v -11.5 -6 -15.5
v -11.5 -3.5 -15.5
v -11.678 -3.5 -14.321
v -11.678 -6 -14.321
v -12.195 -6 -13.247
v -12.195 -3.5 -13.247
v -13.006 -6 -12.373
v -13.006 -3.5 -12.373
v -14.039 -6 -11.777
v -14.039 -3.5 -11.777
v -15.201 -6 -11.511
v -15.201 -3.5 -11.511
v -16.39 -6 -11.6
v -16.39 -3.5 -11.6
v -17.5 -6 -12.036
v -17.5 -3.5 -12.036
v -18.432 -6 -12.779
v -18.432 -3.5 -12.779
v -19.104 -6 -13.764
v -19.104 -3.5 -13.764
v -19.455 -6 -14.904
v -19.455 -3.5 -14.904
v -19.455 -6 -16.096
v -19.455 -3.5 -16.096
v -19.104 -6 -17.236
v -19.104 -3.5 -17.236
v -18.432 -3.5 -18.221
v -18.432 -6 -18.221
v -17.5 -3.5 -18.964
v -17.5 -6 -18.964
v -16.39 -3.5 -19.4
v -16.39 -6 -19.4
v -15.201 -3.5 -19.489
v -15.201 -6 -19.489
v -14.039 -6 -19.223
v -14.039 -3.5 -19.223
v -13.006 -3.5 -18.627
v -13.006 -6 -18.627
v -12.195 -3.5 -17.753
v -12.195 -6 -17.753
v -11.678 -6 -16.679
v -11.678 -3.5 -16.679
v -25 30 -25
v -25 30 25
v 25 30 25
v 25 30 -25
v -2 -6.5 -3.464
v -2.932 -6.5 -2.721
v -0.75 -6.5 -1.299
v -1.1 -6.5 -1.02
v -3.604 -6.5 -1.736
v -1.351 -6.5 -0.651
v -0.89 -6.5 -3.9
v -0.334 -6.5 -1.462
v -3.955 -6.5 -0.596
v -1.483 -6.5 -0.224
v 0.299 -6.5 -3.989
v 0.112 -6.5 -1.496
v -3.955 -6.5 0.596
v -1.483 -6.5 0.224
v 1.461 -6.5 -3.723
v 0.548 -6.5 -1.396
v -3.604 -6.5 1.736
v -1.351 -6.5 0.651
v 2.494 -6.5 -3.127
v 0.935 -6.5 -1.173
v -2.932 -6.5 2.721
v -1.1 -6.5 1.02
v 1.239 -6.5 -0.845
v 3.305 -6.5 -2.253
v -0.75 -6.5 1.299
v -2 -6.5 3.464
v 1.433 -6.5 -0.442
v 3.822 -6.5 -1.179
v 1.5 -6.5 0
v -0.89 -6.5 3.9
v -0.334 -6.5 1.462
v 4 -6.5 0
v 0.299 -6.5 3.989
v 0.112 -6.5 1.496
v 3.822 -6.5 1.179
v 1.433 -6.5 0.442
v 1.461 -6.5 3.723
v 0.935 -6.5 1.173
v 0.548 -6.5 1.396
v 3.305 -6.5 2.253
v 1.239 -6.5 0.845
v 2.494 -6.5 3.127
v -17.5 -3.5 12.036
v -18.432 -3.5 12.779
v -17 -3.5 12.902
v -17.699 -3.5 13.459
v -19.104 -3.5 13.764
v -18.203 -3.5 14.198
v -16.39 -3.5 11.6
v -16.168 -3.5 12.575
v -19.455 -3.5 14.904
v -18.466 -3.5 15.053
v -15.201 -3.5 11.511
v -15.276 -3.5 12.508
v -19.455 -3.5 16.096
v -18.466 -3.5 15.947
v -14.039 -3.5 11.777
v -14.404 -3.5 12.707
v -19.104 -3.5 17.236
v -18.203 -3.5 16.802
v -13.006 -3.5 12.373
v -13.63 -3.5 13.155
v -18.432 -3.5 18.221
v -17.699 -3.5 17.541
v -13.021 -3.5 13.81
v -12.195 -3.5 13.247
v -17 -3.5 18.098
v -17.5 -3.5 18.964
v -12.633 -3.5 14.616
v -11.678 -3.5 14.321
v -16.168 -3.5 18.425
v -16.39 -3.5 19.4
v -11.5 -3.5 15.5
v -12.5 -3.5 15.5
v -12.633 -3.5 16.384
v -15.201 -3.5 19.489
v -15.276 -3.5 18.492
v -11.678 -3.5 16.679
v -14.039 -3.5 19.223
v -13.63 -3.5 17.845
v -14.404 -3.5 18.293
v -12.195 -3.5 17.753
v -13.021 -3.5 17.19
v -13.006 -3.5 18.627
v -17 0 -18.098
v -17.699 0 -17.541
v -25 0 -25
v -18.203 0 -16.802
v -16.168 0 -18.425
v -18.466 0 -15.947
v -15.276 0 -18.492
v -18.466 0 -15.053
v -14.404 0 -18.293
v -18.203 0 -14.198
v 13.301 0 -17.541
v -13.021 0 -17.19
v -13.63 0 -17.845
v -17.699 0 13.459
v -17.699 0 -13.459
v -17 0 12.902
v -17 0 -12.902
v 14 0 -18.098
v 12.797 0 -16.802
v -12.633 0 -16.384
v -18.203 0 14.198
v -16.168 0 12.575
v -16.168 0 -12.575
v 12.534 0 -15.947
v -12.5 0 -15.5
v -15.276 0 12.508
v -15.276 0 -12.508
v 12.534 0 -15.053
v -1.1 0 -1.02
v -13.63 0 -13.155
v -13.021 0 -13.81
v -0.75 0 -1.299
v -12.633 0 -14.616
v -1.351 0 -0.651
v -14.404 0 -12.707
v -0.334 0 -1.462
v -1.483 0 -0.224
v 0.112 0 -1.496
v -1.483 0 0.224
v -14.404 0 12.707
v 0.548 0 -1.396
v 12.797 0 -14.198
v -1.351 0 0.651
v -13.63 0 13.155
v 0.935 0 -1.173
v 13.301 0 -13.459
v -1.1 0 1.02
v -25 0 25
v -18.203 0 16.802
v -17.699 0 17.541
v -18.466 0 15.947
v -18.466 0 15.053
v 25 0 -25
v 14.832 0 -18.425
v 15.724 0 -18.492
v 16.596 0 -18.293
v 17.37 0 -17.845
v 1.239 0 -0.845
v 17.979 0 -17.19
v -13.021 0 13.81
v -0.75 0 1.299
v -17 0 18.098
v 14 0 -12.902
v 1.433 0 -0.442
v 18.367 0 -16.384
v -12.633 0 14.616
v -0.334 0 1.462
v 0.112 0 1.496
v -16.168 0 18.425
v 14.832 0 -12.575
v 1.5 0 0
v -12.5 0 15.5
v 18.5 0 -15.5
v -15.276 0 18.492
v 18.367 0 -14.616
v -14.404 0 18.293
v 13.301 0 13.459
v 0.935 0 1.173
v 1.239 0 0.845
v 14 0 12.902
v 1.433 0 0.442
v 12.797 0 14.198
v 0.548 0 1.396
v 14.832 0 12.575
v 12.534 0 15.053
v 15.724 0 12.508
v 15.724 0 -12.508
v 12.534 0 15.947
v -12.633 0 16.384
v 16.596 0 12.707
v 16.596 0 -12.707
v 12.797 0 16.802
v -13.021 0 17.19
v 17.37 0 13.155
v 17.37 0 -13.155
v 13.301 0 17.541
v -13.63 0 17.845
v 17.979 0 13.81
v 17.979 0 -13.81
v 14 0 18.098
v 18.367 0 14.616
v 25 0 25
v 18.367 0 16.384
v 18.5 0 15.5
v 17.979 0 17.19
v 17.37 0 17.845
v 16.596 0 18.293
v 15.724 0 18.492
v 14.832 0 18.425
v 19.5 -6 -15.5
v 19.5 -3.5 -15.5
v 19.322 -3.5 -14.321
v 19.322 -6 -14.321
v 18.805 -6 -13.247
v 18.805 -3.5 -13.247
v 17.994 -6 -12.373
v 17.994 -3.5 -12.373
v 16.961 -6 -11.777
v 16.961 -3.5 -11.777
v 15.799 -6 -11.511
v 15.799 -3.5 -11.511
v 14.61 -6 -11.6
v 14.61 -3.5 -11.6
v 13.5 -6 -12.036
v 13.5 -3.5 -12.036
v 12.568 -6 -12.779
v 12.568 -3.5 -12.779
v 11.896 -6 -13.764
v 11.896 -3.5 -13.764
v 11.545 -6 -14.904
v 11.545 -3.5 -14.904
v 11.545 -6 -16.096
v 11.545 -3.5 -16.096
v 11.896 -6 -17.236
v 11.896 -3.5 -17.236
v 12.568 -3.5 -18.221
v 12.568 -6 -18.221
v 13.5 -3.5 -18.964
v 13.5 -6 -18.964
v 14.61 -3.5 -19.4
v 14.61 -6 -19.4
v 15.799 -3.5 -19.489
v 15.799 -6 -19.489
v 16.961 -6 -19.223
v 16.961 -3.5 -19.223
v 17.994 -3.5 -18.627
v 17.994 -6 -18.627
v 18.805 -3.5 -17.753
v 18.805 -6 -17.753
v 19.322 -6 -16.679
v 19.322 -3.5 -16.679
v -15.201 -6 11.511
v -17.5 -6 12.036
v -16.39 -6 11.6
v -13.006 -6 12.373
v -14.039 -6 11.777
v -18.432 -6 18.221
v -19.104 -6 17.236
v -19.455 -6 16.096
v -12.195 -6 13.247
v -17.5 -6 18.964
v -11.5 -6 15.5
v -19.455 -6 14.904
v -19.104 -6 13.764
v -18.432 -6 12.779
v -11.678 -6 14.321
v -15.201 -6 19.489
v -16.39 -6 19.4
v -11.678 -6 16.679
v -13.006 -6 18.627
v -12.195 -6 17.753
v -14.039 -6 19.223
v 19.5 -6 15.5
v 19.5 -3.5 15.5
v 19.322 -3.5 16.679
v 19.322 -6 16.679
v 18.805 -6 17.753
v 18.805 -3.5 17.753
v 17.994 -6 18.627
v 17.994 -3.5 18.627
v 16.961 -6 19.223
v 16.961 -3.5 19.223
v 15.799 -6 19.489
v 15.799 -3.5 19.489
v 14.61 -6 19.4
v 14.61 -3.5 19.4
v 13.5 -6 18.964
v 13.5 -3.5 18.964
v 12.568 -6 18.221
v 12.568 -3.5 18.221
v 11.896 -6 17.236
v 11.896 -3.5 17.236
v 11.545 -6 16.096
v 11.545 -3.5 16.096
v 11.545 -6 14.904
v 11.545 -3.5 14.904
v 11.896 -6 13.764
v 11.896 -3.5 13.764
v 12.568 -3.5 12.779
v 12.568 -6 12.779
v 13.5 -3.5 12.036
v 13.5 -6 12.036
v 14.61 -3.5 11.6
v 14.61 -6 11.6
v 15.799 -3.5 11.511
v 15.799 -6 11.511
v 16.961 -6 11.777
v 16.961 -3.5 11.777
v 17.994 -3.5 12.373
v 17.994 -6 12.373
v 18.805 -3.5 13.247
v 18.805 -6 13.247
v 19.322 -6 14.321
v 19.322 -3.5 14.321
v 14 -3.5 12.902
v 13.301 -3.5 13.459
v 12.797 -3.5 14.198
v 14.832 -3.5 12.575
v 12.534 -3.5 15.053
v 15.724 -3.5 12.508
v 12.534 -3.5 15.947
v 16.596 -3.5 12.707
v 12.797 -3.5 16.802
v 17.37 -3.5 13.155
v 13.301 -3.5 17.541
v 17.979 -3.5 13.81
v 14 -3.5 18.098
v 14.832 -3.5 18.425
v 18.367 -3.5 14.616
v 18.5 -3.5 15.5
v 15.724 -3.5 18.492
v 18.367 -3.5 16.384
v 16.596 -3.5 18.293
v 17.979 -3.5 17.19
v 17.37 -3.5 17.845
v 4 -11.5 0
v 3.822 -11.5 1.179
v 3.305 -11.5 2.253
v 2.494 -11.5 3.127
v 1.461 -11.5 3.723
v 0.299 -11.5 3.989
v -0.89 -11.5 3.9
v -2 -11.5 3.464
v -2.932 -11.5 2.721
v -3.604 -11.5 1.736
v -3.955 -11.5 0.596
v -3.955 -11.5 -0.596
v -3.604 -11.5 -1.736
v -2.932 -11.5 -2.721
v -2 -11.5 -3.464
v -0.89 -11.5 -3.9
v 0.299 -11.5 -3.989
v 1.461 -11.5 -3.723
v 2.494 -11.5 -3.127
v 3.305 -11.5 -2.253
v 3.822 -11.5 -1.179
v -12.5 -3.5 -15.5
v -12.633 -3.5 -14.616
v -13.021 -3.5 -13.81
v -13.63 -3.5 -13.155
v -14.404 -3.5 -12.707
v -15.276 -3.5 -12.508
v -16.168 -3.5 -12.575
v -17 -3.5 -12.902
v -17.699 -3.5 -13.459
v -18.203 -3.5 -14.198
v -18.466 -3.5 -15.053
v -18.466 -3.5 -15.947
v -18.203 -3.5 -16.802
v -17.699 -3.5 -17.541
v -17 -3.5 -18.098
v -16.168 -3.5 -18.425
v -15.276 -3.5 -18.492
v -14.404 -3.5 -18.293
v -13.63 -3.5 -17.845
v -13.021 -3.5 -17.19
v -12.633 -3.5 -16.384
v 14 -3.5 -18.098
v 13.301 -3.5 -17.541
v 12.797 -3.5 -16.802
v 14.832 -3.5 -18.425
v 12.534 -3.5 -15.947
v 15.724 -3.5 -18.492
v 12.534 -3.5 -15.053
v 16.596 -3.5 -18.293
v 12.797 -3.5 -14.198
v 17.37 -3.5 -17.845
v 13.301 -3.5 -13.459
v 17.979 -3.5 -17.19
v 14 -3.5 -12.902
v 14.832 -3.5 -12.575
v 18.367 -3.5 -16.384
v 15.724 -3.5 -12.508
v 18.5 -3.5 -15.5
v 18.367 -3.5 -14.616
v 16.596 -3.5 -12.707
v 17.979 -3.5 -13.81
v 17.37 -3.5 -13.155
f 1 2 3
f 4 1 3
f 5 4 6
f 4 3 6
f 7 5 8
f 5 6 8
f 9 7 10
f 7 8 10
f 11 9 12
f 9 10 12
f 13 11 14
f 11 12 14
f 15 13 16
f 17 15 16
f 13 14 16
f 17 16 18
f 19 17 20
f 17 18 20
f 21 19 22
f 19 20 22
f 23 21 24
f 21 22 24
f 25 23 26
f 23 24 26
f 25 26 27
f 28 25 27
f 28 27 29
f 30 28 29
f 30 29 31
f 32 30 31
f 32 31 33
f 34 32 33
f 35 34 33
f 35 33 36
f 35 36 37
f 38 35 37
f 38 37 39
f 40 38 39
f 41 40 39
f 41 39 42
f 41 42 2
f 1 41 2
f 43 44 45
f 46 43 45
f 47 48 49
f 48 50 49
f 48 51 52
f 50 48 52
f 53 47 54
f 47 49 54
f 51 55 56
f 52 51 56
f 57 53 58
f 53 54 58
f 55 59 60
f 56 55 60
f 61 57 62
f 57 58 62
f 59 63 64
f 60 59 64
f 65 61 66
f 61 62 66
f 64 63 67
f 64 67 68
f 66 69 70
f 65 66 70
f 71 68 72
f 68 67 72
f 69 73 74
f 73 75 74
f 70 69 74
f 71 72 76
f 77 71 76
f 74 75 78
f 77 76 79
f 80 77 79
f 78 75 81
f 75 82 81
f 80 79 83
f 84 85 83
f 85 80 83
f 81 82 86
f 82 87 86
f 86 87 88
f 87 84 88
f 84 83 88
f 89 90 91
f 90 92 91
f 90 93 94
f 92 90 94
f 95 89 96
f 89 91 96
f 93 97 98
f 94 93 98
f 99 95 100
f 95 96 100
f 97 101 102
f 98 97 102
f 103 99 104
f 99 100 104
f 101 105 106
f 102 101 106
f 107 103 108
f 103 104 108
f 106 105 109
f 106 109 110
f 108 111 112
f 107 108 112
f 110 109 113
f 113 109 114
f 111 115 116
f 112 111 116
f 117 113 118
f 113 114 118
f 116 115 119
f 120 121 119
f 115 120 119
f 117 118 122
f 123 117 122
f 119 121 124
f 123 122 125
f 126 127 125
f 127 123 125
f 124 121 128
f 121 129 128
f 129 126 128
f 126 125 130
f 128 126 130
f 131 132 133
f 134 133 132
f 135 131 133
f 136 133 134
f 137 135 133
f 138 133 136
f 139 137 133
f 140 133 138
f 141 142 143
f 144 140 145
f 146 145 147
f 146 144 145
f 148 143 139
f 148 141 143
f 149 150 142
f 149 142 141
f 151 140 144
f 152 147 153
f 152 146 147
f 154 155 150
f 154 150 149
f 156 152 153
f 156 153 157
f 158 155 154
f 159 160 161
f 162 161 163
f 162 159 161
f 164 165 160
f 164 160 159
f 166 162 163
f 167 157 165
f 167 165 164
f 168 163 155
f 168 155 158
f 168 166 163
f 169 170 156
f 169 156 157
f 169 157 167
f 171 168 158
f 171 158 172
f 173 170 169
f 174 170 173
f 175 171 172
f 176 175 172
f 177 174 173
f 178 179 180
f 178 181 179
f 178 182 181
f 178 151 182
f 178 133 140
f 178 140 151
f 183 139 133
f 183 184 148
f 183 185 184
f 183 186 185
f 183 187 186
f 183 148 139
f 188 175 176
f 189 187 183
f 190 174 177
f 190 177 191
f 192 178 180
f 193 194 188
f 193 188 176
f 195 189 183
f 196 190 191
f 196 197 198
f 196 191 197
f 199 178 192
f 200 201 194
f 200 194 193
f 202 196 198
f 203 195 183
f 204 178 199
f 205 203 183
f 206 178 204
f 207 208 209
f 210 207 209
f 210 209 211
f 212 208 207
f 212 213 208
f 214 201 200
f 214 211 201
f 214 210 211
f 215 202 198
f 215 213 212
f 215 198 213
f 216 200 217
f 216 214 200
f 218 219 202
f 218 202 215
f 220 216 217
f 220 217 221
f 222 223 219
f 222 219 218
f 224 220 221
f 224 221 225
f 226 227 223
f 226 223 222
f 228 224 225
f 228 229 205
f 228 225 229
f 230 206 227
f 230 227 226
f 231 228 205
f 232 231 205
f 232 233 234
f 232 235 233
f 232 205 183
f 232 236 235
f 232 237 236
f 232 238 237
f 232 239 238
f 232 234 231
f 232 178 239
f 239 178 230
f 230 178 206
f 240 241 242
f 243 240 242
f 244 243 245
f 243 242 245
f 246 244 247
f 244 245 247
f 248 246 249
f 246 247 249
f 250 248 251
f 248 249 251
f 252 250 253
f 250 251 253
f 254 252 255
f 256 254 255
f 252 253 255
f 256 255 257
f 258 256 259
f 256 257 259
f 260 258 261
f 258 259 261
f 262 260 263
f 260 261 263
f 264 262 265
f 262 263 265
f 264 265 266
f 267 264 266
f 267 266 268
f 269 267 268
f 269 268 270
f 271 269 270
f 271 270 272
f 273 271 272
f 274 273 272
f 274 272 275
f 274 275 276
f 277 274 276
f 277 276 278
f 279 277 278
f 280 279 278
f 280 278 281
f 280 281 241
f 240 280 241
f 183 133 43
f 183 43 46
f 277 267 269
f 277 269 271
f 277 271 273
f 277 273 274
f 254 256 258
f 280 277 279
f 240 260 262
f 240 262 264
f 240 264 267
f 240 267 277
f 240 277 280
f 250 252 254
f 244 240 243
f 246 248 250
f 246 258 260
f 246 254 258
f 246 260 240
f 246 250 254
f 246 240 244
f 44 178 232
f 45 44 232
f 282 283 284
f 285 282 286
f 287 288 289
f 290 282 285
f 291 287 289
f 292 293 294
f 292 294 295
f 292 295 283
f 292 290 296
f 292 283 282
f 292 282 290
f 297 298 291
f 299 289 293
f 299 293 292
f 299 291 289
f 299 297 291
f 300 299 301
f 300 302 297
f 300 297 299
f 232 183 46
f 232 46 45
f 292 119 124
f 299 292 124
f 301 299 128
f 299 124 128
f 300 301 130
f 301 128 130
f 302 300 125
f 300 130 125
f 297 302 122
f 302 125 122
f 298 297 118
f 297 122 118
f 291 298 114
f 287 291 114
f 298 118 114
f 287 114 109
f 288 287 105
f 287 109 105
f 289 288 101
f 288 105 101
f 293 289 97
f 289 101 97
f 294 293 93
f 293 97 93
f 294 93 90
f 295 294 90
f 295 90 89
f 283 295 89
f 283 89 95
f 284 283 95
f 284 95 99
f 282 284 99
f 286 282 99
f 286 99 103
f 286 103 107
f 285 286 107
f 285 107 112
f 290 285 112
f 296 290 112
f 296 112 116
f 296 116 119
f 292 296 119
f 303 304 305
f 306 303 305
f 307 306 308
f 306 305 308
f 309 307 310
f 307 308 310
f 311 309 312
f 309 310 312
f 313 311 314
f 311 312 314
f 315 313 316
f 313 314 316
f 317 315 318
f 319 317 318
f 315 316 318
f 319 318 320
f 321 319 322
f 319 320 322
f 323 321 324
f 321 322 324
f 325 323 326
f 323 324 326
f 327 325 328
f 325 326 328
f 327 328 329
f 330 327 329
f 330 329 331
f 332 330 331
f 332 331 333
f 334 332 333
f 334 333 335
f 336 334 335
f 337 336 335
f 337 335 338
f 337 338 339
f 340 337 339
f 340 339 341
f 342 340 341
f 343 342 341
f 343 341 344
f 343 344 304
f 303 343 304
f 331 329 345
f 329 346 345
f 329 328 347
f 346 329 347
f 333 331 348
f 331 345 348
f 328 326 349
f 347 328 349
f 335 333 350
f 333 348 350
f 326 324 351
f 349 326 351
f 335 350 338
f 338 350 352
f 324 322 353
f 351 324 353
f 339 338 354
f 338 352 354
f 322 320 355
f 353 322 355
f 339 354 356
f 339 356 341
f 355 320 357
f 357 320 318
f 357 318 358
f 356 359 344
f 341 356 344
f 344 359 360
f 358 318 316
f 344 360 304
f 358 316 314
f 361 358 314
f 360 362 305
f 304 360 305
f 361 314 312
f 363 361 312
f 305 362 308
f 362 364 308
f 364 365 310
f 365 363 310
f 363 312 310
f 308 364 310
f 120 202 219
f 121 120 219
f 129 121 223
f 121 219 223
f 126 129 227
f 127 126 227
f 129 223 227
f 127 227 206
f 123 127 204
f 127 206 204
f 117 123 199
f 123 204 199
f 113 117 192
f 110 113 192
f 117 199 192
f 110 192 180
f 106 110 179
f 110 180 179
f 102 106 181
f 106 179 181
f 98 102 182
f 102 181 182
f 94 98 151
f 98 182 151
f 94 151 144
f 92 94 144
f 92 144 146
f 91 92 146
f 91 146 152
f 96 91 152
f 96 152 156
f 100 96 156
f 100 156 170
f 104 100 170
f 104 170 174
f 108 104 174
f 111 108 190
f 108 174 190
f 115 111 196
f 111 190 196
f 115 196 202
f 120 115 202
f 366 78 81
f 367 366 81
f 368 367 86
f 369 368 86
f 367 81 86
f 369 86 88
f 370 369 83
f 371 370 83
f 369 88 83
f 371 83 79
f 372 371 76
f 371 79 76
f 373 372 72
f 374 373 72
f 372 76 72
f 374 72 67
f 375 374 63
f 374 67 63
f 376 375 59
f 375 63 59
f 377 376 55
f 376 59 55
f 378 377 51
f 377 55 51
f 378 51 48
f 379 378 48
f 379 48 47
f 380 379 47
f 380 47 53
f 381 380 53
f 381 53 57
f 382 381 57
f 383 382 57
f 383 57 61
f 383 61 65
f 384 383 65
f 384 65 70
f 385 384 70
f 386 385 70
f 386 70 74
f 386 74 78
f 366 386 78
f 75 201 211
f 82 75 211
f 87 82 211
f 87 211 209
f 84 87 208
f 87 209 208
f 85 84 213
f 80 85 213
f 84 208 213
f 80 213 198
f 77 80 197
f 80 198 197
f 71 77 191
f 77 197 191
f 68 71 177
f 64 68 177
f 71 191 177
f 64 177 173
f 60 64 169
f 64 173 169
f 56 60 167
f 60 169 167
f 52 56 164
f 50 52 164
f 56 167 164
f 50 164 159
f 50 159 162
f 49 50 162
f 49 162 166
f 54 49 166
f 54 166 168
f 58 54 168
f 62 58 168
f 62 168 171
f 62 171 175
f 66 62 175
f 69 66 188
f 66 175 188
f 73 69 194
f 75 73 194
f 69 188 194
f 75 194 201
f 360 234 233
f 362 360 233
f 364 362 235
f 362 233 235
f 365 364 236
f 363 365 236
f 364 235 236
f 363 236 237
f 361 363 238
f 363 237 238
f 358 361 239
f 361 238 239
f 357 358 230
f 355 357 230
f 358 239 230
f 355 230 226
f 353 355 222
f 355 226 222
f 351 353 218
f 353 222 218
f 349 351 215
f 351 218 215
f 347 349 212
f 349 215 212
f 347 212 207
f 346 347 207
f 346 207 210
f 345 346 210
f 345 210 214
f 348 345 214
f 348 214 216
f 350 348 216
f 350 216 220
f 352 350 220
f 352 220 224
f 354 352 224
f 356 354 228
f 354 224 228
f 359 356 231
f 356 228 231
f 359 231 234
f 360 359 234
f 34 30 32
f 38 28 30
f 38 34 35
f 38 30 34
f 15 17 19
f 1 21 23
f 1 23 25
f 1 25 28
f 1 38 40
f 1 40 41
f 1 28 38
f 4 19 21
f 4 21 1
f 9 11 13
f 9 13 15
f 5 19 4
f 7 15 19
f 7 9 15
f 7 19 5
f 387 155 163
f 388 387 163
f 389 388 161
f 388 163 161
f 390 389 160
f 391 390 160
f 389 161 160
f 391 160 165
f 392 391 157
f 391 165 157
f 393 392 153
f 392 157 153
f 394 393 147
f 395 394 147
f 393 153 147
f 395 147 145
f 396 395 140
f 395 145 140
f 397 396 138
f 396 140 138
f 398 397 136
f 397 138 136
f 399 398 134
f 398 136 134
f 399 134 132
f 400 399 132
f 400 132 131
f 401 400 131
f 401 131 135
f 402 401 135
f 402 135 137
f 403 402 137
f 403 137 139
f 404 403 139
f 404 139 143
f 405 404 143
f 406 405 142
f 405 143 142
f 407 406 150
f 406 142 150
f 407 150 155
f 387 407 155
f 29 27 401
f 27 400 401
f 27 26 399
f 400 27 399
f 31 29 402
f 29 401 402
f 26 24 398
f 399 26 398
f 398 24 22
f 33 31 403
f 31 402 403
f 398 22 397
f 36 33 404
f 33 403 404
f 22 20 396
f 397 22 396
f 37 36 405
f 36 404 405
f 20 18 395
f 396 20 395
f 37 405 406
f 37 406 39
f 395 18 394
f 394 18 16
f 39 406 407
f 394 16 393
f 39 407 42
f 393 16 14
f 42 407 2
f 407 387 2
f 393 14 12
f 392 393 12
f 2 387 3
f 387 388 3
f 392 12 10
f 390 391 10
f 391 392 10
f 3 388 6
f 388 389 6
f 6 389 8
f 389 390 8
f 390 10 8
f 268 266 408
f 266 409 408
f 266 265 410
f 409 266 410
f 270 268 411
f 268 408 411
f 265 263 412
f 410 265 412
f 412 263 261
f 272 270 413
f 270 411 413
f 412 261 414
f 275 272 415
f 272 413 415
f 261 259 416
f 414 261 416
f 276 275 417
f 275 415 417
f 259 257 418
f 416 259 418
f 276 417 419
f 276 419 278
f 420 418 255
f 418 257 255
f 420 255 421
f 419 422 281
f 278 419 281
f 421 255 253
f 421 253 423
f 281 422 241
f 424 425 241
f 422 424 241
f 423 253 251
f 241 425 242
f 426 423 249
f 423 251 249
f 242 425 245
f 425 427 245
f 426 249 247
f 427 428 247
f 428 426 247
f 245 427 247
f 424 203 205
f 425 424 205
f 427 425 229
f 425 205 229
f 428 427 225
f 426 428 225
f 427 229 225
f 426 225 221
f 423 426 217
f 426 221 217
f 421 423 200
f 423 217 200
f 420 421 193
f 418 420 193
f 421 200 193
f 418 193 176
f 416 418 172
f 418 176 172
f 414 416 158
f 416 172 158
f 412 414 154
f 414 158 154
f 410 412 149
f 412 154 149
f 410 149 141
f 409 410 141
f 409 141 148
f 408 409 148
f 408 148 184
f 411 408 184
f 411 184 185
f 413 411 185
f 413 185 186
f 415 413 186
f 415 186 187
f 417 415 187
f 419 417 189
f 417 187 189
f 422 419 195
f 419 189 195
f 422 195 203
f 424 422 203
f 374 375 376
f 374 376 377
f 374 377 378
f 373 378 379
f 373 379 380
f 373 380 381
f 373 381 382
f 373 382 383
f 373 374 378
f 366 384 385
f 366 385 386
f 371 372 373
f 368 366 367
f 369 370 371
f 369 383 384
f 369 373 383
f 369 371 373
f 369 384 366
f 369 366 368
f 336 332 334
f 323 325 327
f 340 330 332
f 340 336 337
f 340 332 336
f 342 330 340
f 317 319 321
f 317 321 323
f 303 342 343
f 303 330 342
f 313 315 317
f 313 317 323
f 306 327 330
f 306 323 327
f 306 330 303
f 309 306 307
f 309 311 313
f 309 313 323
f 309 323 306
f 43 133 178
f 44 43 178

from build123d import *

# Parameters (mm, degrees)
F0_W     = 50
F0_H     = 50
F0_R     = 4
F0_R_2   = 3
F0_R_3   = 1.5
F1_DEPTH = 30
F2_DEPTH = 6
F3_DEPTH = 6
F4_DEPTH = 11.5
F5_DEPTH = 3.5
F6_DEPTH = 6.5


with BuildPart() as f1:
    # F0 (on Front) → F1 (new body)
    with BuildSketch(Plane.XZ):
        Rectangle(F0_W, F0_H)
        with Locations((-15.5, -15.5)):
            Circle(F0_R, mode=Mode.SUBTRACT)
        with Locations((15.5, -15.5)):
            Circle(F0_R, mode=Mode.SUBTRACT)
        with Locations((-15.5, 15.5)):
            Circle(F0_R, mode=Mode.SUBTRACT)
        Circle(F0_R, mode=Mode.SUBTRACT)
        with Locations((15.5, 15.5)):
            Circle(F0_R, mode=Mode.SUBTRACT)
        with Locations((-15.5, 15.5)):
            Circle(F0_R)
        with Locations((-15.5, 15.5)):
            Circle(F0_R_2, mode=Mode.SUBTRACT)
        with Locations((-15.5, -15.5)):
            Circle(F0_R)
        with Locations((-15.5, -15.5)):
            Circle(F0_R_2, mode=Mode.SUBTRACT)
        with Locations((15.5, -15.5)):
            Circle(F0_R)
        with Locations((15.5, -15.5)):
            Circle(F0_R_2, mode=Mode.SUBTRACT)
        with Locations((15.5, 15.5)):
            Circle(F0_R)
        with Locations((15.5, 15.5)):
            Circle(F0_R_2, mode=Mode.SUBTRACT)
        with Locations((15.5, -15.5)):
            Circle(F0_R_2)
        with Locations((-15.5, -15.5)):
            Circle(F0_R_2)
        with Locations((15.5, 15.5)):
            Circle(F0_R_2)
        with Locations((-15.5, 15.5)):
            Circle(F0_R_2)
        Circle(F0_R)
        Circle(F0_R_3, mode=Mode.SUBTRACT)
        Circle(F0_R_3)
    extrude(amount=-F1_DEPTH)

    # F0 (on Front) → F2 (join)
    with BuildSketch(Plane.XZ):
        with Locations((-15.5, 15.5)):
            Circle(F0_R)
        with Locations((-15.5, 15.5)):
            Circle(F0_R_2, mode=Mode.SUBTRACT)
        with Locations((15.5, 15.5)):
            Circle(F0_R)
        with Locations((15.5, 15.5)):
            Circle(F0_R_2, mode=Mode.SUBTRACT)
        with Locations((15.5, -15.5)):
            Circle(F0_R)
        with Locations((15.5, -15.5)):
            Circle(F0_R_2, mode=Mode.SUBTRACT)
        with Locations((-15.5, -15.5)):
            Circle(F0_R)
        with Locations((-15.5, -15.5)):
            Circle(F0_R_2, mode=Mode.SUBTRACT)
    extrude(amount=F2_DEPTH)

    # F0 (on Front) → F3 (join)
    with BuildSketch(Plane.XZ):
        with Locations((-15.5, 15.5)):
            Circle(F0_R_2)
        with Locations((15.5, 15.5)):
            Circle(F0_R_2)
        with Locations((15.5, -15.5)):
            Circle(F0_R_2)
        with Locations((-15.5, -15.5)):
            Circle(F0_R_2)
    extrude(amount=F3_DEPTH)

    # F0 (on Front) → F4 (join)
    with BuildSketch(Plane.XZ):
        Circle(F0_R)
        Circle(F0_R_3, mode=Mode.SUBTRACT)
        Circle(F0_R_3)
    extrude(amount=F4_DEPTH)

    # F0 (on Front) → F5 (cut)
    with BuildSketch(Plane.XZ):
        with Locations((-15.5, -15.5)):
            Circle(F0_R)
        with Locations((-15.5, -15.5)):
            Circle(F0_R_2, mode=Mode.SUBTRACT)
        with Locations((15.5, -15.5)):
            Circle(F0_R)
        with Locations((15.5, -15.5)):
            Circle(F0_R_2, mode=Mode.SUBTRACT)
        with Locations((15.5, 15.5)):
            Circle(F0_R)
        with Locations((15.5, 15.5)):
            Circle(F0_R_2, mode=Mode.SUBTRACT)
        with Locations((-15.5, 15.5)):
            Circle(F0_R)
        with Locations((-15.5, 15.5)):
            Circle(F0_R_2, mode=Mode.SUBTRACT)
    extrude(amount=F5_DEPTH, mode=Mode.SUBTRACT)

    # F0 (on Front) → F6 (cut)
    with BuildSketch(Plane.XZ):
        Circle(F0_R)
        Circle(F0_R_3, mode=Mode.SUBTRACT)
    extrude(amount=F6_DEPTH, mode=Mode.SUBTRACT)


solid = f1.part
